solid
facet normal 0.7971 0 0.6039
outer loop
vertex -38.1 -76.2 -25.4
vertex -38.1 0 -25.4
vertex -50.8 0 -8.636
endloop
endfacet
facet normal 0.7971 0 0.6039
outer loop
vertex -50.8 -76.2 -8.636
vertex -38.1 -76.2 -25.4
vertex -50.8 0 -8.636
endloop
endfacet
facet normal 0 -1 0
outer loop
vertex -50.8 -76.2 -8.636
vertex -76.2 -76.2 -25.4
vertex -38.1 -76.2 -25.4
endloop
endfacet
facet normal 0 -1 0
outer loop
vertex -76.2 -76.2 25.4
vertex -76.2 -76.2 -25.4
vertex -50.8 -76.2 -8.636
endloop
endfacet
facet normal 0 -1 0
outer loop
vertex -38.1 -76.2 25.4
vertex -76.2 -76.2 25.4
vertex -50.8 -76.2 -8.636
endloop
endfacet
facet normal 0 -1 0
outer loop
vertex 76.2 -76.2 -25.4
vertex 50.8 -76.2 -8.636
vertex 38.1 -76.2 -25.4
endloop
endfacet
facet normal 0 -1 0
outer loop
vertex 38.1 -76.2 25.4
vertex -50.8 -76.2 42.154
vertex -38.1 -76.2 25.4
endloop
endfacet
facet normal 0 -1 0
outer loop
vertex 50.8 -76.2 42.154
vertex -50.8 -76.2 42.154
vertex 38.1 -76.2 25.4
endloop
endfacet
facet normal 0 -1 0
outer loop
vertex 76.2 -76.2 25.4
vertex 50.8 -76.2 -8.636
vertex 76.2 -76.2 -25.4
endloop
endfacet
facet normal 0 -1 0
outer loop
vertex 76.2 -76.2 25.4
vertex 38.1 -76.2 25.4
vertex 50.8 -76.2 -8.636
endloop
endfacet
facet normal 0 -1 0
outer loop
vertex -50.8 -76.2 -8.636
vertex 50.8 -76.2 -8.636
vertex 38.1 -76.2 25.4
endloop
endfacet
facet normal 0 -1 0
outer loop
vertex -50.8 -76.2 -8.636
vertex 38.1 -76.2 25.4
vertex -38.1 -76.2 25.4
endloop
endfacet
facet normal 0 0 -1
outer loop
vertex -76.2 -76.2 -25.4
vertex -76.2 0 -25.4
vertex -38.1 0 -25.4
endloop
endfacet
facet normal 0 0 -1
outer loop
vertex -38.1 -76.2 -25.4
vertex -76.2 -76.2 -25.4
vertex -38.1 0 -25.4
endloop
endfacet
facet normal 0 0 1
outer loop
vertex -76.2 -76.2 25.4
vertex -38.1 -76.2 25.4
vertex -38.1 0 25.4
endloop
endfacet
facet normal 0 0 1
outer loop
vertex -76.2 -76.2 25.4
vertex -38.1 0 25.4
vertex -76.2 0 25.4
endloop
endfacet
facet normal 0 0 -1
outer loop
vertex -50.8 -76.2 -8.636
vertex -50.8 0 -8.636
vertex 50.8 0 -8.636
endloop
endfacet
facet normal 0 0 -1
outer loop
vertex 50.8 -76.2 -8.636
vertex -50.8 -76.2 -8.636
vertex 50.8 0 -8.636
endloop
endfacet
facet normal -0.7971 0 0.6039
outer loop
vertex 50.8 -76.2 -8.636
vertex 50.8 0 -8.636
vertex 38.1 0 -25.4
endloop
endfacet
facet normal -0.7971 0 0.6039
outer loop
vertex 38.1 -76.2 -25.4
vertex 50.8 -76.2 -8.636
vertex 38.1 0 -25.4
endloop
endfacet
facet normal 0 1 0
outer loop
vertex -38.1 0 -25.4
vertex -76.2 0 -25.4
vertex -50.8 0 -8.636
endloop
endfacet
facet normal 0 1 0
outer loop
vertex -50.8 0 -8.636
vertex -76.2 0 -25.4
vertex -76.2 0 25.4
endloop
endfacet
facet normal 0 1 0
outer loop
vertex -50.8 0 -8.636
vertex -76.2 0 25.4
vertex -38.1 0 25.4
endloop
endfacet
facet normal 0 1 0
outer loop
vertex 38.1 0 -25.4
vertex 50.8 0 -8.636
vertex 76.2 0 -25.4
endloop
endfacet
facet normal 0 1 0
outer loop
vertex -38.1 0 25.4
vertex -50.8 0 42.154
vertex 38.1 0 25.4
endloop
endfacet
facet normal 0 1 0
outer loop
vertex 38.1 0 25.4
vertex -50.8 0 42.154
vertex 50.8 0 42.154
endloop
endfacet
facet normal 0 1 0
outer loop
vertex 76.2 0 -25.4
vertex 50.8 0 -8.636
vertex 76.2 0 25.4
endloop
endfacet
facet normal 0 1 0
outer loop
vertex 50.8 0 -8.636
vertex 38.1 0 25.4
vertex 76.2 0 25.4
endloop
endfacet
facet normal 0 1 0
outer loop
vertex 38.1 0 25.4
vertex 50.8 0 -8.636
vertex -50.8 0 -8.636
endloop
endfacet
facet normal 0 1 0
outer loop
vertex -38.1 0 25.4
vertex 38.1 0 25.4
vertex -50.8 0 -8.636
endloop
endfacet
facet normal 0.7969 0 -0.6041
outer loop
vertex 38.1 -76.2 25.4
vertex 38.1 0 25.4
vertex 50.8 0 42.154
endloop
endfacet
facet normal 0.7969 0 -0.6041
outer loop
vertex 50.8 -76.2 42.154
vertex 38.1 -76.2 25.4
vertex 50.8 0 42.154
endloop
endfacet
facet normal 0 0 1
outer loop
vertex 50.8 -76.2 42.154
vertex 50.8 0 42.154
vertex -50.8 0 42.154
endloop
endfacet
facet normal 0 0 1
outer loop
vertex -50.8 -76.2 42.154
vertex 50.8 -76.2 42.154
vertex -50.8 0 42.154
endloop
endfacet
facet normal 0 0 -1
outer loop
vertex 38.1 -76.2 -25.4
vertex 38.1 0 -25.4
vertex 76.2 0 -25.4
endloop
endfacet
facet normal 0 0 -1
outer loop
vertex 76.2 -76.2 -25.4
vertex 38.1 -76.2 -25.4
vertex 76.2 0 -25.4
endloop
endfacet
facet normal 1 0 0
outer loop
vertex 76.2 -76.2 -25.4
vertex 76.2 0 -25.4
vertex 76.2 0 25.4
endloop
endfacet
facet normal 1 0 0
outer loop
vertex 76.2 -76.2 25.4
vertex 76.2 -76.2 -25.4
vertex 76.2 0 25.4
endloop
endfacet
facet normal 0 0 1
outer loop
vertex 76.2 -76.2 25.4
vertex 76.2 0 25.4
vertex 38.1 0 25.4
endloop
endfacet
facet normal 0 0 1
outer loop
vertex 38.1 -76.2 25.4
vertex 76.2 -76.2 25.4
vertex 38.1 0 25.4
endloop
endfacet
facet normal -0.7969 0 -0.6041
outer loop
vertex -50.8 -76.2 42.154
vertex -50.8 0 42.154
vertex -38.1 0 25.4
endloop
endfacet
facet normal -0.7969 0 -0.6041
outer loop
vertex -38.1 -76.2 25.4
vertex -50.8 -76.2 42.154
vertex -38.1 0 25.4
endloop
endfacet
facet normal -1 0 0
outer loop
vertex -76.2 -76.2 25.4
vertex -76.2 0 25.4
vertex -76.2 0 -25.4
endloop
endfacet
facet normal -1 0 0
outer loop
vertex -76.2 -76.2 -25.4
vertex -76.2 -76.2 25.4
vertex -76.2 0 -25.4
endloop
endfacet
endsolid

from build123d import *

# Parameters (mm, degrees)
F1_DEPTH = 76.2


with BuildPart() as f1:
    # F0 (on Front) → F1 (new body)
    with BuildSketch(Plane.XZ):
        Polygon((-38.1, 25.4), (-76.2, 25.4), (-76.2, -25.4), (-38.1, -25.4), (-50.8, -8.636308), (50.8, -8.636308), (38.1, -25.4), (76.2, -25.4), (76.2, 25.4), (38.1, 25.4), align=None)
        Polygon((-50.8, 42.153515), (-38.1, 25.4), (38.1, 25.4), (50.8, 42.153515), align=None)
    extrude(amount=F1_DEPTH)


solid = f1.part
